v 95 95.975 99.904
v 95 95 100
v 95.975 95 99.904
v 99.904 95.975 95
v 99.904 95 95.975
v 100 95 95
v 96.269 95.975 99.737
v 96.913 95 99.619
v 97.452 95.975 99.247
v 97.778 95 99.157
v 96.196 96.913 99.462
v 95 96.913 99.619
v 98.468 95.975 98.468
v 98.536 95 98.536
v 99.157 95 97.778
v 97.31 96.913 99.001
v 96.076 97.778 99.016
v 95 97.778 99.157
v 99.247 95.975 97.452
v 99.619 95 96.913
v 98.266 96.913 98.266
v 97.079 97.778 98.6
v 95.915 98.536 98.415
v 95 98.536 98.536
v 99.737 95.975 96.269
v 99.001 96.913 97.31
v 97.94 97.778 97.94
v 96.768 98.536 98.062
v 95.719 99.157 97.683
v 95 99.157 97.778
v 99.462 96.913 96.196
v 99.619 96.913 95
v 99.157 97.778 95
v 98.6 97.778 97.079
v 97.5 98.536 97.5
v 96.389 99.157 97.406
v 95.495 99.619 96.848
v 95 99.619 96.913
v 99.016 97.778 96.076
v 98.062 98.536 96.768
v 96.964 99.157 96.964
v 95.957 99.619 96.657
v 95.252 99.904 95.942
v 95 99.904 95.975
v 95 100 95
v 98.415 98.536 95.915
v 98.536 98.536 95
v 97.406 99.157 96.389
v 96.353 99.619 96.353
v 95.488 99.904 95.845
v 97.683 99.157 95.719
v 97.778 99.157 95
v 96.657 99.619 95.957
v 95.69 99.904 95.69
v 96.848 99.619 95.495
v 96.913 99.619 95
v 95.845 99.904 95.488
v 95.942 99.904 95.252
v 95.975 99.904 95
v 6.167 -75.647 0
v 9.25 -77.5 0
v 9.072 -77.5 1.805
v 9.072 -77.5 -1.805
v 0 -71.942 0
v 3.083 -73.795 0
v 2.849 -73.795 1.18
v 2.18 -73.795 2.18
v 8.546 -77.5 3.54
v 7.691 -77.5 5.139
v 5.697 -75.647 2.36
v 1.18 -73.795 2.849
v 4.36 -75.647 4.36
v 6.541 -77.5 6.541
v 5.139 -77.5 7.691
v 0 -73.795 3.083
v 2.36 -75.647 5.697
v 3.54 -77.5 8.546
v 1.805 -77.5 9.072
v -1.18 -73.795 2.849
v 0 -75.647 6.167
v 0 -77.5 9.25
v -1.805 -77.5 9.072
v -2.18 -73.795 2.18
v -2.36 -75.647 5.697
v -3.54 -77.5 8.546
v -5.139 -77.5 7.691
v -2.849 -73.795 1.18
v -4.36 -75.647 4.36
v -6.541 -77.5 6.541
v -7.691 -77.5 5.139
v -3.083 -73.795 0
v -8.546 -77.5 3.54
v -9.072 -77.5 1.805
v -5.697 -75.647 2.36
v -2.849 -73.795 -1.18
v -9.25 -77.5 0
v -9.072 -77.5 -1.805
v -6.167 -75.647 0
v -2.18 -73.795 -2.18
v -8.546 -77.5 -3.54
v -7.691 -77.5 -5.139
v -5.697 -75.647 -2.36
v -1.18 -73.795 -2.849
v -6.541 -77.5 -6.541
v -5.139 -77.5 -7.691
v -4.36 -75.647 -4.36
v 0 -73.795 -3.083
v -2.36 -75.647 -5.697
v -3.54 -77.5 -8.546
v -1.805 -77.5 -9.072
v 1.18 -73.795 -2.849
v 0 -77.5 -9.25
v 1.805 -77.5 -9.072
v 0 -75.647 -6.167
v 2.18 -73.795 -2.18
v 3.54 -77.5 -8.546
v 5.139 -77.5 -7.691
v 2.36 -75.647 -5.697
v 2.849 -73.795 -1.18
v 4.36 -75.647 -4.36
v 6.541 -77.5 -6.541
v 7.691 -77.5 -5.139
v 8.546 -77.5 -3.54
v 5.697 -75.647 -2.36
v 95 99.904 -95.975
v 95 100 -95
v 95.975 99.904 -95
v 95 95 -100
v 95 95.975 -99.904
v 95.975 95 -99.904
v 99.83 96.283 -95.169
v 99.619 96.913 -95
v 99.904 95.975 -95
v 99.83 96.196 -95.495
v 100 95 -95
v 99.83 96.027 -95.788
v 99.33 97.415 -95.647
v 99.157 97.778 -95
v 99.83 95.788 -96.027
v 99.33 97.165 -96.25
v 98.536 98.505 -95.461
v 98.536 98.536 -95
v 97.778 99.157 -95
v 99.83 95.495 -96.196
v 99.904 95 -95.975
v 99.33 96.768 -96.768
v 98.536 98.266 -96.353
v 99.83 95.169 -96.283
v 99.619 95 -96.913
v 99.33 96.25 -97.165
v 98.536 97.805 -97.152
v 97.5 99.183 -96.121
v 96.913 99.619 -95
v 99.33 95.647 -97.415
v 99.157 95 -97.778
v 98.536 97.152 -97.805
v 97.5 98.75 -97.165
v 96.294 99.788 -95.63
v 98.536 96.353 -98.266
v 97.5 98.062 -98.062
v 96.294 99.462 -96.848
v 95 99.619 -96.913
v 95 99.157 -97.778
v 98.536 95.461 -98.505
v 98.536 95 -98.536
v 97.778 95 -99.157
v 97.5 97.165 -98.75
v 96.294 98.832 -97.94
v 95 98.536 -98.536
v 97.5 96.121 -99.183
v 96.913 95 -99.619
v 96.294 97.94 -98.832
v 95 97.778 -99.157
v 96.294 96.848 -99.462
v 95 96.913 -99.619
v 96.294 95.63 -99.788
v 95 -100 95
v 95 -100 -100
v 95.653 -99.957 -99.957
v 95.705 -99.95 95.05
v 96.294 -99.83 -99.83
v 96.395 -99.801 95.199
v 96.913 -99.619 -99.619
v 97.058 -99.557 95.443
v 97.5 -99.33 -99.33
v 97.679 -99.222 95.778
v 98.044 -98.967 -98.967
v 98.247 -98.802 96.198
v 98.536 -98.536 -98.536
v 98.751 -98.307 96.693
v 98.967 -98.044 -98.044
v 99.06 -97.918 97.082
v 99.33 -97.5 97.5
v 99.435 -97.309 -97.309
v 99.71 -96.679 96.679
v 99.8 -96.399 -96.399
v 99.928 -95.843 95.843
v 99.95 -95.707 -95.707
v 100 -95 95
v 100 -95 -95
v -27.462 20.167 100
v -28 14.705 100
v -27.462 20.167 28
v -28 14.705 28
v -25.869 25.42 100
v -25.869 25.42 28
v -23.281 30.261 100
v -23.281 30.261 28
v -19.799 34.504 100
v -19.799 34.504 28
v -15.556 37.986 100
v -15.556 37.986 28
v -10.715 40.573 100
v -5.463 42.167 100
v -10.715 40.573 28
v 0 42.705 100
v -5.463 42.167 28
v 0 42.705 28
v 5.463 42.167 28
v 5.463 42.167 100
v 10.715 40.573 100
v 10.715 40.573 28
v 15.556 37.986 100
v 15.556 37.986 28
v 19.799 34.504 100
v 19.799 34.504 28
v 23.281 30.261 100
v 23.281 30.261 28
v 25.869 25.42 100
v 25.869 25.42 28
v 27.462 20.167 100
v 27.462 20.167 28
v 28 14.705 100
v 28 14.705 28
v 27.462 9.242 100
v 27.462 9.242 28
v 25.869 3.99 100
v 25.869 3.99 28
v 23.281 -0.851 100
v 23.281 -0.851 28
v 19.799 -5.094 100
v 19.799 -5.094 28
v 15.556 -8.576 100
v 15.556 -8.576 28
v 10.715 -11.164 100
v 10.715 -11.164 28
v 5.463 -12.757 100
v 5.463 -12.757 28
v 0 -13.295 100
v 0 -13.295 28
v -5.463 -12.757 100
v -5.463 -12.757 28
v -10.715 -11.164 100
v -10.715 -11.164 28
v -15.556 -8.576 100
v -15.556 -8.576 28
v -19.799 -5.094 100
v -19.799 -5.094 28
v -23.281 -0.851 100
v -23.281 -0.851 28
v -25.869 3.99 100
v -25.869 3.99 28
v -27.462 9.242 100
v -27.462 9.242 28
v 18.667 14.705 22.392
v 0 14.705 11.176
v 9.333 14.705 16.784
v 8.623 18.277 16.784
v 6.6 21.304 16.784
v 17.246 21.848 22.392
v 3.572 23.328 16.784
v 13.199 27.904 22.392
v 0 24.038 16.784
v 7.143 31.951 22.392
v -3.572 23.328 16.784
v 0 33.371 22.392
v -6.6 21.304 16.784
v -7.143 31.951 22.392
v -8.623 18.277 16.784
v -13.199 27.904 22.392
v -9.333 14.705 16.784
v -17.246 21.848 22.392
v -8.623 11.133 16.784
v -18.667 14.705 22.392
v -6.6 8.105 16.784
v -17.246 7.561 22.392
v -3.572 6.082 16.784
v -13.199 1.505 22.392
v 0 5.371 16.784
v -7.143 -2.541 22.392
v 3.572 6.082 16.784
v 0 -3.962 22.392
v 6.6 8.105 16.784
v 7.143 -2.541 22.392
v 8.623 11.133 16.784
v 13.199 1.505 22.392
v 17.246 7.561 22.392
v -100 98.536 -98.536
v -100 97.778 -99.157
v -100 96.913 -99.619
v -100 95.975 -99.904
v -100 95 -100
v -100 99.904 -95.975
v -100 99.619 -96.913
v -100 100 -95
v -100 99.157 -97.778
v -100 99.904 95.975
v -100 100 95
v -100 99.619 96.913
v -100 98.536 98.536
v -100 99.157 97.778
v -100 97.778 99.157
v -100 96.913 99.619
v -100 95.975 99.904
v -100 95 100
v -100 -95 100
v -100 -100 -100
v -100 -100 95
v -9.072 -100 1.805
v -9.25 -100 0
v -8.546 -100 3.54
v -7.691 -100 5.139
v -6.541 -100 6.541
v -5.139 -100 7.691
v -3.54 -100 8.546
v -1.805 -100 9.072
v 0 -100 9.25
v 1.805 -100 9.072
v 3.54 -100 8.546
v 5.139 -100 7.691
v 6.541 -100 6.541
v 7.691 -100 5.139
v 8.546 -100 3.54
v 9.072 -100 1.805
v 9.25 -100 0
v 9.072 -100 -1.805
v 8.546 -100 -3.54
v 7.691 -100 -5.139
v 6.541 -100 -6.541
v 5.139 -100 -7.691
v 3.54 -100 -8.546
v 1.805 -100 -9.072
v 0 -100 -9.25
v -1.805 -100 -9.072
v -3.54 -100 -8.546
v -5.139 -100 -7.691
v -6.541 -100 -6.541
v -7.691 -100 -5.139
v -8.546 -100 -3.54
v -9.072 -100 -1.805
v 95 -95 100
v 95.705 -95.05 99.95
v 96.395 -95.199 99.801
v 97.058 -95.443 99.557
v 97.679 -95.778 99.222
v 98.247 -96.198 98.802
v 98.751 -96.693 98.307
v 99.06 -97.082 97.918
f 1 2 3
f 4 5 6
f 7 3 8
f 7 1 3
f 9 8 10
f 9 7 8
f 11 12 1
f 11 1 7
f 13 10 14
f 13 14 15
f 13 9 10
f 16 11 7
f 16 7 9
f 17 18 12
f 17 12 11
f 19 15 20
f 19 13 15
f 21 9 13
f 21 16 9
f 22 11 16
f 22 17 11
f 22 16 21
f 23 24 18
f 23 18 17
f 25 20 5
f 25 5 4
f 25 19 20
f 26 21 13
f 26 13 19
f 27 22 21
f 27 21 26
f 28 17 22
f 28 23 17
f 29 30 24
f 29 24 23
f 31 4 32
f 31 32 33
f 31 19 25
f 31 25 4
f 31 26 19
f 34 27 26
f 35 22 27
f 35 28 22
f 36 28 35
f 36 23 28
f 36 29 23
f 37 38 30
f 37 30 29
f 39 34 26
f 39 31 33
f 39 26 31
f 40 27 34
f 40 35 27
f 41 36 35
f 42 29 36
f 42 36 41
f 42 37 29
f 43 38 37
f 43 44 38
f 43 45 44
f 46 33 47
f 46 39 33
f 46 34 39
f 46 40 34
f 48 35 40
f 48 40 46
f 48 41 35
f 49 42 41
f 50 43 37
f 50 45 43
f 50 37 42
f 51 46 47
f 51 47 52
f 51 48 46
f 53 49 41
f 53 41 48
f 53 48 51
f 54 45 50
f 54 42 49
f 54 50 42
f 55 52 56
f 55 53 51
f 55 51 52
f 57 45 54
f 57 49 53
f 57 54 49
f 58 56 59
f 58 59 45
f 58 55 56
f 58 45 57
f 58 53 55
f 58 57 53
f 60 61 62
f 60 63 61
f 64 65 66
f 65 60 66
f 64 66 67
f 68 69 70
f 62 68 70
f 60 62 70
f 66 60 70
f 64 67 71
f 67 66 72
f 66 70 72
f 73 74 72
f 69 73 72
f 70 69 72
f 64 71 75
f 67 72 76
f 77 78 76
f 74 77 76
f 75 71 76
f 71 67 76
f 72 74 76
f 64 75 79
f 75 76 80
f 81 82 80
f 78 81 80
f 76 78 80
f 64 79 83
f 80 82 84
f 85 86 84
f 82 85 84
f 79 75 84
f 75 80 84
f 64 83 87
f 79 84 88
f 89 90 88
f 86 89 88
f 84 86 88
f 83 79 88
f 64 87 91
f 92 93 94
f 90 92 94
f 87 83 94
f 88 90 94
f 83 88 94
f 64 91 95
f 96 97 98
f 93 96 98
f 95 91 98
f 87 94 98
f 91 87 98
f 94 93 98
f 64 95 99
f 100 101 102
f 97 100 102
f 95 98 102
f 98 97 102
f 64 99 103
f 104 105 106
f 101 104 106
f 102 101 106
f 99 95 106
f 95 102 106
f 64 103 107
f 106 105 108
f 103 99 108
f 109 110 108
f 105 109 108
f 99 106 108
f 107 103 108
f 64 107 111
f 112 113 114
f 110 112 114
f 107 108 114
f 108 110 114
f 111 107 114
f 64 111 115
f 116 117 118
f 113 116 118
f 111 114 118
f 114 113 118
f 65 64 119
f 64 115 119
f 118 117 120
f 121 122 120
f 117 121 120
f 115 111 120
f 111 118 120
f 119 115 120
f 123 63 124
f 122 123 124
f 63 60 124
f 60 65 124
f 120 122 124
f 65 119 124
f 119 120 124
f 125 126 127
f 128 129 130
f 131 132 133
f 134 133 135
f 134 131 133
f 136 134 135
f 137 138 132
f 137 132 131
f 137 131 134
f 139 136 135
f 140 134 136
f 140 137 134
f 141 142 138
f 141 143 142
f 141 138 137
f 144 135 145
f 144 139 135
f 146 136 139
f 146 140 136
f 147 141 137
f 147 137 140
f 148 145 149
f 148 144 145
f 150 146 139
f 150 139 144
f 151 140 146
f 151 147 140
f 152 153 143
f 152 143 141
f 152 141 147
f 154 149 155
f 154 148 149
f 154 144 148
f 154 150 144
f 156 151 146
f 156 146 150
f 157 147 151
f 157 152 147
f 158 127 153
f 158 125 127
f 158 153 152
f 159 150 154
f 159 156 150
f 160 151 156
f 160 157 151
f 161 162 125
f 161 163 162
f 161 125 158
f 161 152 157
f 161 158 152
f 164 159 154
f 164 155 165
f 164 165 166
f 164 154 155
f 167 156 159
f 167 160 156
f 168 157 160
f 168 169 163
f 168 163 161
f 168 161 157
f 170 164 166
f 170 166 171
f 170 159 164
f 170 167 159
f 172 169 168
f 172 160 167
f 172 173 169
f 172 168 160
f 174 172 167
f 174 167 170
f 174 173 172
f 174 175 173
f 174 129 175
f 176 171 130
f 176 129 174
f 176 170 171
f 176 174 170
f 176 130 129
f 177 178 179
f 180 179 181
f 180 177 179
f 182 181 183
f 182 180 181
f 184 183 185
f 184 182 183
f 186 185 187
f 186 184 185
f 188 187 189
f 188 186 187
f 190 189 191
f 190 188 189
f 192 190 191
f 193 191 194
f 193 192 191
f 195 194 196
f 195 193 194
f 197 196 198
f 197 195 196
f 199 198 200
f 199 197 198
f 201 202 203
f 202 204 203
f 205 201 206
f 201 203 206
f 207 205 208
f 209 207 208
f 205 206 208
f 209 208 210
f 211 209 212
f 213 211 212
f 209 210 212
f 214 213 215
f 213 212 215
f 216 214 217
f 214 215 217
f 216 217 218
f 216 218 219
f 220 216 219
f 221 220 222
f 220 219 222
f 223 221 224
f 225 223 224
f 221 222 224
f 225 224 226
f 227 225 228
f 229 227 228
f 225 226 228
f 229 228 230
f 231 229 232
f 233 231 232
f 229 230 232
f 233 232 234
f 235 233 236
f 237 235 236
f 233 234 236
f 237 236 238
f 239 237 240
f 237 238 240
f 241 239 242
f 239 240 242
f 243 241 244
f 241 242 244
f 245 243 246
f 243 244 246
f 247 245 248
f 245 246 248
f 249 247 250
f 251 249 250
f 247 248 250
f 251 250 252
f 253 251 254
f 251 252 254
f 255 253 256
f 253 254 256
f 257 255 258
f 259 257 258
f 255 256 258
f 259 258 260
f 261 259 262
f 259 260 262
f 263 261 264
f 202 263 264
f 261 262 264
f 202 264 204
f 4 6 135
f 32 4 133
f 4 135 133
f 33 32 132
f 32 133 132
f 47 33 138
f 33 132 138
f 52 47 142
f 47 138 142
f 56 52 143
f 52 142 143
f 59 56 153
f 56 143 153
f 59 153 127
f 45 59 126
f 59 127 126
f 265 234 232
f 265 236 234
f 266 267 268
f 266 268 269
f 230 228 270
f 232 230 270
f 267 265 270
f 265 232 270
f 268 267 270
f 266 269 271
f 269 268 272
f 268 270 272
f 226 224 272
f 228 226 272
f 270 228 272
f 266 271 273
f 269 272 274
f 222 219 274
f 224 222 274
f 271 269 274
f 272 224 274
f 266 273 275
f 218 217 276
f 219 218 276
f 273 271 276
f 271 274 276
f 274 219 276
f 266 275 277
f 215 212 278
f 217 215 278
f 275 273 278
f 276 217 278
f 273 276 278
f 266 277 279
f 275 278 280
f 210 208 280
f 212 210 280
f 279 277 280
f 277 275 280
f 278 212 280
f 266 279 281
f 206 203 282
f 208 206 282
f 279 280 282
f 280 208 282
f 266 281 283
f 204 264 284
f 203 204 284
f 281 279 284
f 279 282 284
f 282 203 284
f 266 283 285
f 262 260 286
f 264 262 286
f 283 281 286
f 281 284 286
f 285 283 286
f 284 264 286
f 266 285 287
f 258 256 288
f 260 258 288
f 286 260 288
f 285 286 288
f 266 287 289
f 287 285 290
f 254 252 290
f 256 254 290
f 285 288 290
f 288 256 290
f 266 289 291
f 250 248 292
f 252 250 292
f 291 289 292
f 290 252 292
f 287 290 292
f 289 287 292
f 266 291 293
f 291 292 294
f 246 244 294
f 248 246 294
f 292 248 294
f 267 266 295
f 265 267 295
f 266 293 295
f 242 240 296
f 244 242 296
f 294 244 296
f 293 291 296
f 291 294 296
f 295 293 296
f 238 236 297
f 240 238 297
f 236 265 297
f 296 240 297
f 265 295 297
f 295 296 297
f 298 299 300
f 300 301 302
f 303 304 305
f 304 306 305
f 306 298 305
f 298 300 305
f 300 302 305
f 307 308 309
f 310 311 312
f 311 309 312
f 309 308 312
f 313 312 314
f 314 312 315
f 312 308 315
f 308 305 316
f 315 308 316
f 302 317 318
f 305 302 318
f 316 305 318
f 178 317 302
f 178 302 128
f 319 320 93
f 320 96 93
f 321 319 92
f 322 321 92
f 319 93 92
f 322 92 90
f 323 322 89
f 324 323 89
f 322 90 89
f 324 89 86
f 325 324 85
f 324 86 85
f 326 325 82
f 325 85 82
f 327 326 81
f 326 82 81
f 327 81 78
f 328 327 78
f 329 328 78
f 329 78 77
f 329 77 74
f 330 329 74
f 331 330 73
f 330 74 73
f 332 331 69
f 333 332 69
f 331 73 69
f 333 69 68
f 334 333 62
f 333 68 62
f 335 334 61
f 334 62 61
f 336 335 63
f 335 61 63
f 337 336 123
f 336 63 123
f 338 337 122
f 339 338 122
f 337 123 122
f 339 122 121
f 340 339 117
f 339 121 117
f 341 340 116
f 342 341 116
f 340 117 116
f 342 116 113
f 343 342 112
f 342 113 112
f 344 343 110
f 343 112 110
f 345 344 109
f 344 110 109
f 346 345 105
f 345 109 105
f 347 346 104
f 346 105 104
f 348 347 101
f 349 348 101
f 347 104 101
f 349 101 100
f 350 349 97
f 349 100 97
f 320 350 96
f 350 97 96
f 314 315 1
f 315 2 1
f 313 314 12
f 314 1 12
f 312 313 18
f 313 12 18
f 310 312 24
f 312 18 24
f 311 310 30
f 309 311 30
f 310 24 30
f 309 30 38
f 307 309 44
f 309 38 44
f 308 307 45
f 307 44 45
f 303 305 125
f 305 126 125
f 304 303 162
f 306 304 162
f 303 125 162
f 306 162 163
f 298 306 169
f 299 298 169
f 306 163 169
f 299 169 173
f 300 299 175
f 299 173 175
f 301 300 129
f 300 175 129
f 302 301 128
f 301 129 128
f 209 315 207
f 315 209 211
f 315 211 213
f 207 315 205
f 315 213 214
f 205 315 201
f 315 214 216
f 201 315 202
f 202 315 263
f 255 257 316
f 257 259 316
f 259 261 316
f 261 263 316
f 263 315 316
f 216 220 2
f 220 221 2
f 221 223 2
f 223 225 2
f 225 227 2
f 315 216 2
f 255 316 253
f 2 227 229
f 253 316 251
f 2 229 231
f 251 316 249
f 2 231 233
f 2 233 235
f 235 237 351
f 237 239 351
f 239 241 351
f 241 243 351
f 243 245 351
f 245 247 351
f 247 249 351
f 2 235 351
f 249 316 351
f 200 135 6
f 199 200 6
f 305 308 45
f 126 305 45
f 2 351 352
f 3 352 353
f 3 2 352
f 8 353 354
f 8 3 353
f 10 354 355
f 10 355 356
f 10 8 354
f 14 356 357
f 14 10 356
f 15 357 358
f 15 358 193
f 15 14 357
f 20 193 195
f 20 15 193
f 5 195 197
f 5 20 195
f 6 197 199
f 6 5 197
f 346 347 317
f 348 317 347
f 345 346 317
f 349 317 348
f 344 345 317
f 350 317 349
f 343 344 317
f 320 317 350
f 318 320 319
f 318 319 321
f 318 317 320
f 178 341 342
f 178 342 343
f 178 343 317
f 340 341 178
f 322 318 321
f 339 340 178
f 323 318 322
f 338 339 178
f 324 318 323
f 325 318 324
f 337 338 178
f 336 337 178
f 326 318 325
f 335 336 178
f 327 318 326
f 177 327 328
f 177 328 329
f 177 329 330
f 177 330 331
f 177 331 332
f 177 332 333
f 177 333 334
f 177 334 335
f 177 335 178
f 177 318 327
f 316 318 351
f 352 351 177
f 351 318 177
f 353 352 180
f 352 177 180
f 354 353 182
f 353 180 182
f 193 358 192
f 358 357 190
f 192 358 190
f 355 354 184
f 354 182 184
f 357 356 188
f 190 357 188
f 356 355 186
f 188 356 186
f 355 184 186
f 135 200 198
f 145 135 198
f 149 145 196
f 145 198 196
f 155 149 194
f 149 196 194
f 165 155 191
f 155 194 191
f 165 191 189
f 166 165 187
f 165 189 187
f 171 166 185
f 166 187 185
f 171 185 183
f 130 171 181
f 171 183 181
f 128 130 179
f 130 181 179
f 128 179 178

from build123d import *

# Parameters (mm, degrees)
F1_W      = 200
F1_H      = 200
F2_DEPTH  = 100
F4_D      = 18.5
F4_DEPTH  = 22.5
F4_TIP    = 5.557960726
F5_SIZE   = 5
F6_R      = 5
F8_R      = 4.99999
F10_D     = 56
F10_DEPTH = 72
F10_TIP   = 16.8240973328


# Not quite as in the source:
# - a fillet or chamfer is up to 0.001 mm smaller than in the source, because OpenCascade refuses the exact size
# - a feature of the source that left no trace in its solid (it failed there, or was rolled back) is left out


with BuildPart() as f2:
    # F1 (on Front) → F2 (new body, symmetric)
    with BuildSketch(Plane.XZ):
        Rectangle(F1_W, F1_H)
    extrude(amount=F2_DEPTH, both=True)

    # F4
    with Locations(Plane.XZ.offset(100)):
        with Locations((0, 0)):
            Hole(F4_D / 2, depth=F4_DEPTH)
            with Locations((0, 0, -(F4_DEPTH + F4_TIP / 2))):  # 118° drill point
                Cone(0, F4_D / 2, F4_TIP, mode=Mode.SUBTRACT)

    # F5
    f5_edges = [f2.edges().sort_by_distance(p)[0] for p in [
        (0, -100, 100),
    ]]
    chamfer(f5_edges, length=F5_SIZE)

    # F6
    f6_edges = [f2.edges().sort_by_distance(p)[0] for p in [
        (100, 2.5, 100),
    ]]
    fillet(f6_edges, radius=F6_R)

    # F8 (radius 5 in the source; OpenCascade refuses exactly that, so slightly less here)
    f8_edges = [f2.edges().sort_by_distance(p)[0] for p in [
        (0, 100, -100),
        (-2.5, 100, 100),
        (98.535534, 100, 98.535534),
        (100, 100, -2.5),
        (100, -100, -2.5),
        (100, 0, -100),
    ]]
    fillet(f8_edges, radius=F8_R)

    # F10
    with Locations(Plane.XY.offset(100)):
        with Locations((0, 14.7048085928)):
            Hole(F10_D / 2, depth=F10_DEPTH)
            with Locations((0, 0, -(F10_DEPTH + F10_TIP / 2))):  # 118° drill point
                Cone(0, F10_D / 2, F10_TIP, mode=Mode.SUBTRACT)


solid = f2.part
